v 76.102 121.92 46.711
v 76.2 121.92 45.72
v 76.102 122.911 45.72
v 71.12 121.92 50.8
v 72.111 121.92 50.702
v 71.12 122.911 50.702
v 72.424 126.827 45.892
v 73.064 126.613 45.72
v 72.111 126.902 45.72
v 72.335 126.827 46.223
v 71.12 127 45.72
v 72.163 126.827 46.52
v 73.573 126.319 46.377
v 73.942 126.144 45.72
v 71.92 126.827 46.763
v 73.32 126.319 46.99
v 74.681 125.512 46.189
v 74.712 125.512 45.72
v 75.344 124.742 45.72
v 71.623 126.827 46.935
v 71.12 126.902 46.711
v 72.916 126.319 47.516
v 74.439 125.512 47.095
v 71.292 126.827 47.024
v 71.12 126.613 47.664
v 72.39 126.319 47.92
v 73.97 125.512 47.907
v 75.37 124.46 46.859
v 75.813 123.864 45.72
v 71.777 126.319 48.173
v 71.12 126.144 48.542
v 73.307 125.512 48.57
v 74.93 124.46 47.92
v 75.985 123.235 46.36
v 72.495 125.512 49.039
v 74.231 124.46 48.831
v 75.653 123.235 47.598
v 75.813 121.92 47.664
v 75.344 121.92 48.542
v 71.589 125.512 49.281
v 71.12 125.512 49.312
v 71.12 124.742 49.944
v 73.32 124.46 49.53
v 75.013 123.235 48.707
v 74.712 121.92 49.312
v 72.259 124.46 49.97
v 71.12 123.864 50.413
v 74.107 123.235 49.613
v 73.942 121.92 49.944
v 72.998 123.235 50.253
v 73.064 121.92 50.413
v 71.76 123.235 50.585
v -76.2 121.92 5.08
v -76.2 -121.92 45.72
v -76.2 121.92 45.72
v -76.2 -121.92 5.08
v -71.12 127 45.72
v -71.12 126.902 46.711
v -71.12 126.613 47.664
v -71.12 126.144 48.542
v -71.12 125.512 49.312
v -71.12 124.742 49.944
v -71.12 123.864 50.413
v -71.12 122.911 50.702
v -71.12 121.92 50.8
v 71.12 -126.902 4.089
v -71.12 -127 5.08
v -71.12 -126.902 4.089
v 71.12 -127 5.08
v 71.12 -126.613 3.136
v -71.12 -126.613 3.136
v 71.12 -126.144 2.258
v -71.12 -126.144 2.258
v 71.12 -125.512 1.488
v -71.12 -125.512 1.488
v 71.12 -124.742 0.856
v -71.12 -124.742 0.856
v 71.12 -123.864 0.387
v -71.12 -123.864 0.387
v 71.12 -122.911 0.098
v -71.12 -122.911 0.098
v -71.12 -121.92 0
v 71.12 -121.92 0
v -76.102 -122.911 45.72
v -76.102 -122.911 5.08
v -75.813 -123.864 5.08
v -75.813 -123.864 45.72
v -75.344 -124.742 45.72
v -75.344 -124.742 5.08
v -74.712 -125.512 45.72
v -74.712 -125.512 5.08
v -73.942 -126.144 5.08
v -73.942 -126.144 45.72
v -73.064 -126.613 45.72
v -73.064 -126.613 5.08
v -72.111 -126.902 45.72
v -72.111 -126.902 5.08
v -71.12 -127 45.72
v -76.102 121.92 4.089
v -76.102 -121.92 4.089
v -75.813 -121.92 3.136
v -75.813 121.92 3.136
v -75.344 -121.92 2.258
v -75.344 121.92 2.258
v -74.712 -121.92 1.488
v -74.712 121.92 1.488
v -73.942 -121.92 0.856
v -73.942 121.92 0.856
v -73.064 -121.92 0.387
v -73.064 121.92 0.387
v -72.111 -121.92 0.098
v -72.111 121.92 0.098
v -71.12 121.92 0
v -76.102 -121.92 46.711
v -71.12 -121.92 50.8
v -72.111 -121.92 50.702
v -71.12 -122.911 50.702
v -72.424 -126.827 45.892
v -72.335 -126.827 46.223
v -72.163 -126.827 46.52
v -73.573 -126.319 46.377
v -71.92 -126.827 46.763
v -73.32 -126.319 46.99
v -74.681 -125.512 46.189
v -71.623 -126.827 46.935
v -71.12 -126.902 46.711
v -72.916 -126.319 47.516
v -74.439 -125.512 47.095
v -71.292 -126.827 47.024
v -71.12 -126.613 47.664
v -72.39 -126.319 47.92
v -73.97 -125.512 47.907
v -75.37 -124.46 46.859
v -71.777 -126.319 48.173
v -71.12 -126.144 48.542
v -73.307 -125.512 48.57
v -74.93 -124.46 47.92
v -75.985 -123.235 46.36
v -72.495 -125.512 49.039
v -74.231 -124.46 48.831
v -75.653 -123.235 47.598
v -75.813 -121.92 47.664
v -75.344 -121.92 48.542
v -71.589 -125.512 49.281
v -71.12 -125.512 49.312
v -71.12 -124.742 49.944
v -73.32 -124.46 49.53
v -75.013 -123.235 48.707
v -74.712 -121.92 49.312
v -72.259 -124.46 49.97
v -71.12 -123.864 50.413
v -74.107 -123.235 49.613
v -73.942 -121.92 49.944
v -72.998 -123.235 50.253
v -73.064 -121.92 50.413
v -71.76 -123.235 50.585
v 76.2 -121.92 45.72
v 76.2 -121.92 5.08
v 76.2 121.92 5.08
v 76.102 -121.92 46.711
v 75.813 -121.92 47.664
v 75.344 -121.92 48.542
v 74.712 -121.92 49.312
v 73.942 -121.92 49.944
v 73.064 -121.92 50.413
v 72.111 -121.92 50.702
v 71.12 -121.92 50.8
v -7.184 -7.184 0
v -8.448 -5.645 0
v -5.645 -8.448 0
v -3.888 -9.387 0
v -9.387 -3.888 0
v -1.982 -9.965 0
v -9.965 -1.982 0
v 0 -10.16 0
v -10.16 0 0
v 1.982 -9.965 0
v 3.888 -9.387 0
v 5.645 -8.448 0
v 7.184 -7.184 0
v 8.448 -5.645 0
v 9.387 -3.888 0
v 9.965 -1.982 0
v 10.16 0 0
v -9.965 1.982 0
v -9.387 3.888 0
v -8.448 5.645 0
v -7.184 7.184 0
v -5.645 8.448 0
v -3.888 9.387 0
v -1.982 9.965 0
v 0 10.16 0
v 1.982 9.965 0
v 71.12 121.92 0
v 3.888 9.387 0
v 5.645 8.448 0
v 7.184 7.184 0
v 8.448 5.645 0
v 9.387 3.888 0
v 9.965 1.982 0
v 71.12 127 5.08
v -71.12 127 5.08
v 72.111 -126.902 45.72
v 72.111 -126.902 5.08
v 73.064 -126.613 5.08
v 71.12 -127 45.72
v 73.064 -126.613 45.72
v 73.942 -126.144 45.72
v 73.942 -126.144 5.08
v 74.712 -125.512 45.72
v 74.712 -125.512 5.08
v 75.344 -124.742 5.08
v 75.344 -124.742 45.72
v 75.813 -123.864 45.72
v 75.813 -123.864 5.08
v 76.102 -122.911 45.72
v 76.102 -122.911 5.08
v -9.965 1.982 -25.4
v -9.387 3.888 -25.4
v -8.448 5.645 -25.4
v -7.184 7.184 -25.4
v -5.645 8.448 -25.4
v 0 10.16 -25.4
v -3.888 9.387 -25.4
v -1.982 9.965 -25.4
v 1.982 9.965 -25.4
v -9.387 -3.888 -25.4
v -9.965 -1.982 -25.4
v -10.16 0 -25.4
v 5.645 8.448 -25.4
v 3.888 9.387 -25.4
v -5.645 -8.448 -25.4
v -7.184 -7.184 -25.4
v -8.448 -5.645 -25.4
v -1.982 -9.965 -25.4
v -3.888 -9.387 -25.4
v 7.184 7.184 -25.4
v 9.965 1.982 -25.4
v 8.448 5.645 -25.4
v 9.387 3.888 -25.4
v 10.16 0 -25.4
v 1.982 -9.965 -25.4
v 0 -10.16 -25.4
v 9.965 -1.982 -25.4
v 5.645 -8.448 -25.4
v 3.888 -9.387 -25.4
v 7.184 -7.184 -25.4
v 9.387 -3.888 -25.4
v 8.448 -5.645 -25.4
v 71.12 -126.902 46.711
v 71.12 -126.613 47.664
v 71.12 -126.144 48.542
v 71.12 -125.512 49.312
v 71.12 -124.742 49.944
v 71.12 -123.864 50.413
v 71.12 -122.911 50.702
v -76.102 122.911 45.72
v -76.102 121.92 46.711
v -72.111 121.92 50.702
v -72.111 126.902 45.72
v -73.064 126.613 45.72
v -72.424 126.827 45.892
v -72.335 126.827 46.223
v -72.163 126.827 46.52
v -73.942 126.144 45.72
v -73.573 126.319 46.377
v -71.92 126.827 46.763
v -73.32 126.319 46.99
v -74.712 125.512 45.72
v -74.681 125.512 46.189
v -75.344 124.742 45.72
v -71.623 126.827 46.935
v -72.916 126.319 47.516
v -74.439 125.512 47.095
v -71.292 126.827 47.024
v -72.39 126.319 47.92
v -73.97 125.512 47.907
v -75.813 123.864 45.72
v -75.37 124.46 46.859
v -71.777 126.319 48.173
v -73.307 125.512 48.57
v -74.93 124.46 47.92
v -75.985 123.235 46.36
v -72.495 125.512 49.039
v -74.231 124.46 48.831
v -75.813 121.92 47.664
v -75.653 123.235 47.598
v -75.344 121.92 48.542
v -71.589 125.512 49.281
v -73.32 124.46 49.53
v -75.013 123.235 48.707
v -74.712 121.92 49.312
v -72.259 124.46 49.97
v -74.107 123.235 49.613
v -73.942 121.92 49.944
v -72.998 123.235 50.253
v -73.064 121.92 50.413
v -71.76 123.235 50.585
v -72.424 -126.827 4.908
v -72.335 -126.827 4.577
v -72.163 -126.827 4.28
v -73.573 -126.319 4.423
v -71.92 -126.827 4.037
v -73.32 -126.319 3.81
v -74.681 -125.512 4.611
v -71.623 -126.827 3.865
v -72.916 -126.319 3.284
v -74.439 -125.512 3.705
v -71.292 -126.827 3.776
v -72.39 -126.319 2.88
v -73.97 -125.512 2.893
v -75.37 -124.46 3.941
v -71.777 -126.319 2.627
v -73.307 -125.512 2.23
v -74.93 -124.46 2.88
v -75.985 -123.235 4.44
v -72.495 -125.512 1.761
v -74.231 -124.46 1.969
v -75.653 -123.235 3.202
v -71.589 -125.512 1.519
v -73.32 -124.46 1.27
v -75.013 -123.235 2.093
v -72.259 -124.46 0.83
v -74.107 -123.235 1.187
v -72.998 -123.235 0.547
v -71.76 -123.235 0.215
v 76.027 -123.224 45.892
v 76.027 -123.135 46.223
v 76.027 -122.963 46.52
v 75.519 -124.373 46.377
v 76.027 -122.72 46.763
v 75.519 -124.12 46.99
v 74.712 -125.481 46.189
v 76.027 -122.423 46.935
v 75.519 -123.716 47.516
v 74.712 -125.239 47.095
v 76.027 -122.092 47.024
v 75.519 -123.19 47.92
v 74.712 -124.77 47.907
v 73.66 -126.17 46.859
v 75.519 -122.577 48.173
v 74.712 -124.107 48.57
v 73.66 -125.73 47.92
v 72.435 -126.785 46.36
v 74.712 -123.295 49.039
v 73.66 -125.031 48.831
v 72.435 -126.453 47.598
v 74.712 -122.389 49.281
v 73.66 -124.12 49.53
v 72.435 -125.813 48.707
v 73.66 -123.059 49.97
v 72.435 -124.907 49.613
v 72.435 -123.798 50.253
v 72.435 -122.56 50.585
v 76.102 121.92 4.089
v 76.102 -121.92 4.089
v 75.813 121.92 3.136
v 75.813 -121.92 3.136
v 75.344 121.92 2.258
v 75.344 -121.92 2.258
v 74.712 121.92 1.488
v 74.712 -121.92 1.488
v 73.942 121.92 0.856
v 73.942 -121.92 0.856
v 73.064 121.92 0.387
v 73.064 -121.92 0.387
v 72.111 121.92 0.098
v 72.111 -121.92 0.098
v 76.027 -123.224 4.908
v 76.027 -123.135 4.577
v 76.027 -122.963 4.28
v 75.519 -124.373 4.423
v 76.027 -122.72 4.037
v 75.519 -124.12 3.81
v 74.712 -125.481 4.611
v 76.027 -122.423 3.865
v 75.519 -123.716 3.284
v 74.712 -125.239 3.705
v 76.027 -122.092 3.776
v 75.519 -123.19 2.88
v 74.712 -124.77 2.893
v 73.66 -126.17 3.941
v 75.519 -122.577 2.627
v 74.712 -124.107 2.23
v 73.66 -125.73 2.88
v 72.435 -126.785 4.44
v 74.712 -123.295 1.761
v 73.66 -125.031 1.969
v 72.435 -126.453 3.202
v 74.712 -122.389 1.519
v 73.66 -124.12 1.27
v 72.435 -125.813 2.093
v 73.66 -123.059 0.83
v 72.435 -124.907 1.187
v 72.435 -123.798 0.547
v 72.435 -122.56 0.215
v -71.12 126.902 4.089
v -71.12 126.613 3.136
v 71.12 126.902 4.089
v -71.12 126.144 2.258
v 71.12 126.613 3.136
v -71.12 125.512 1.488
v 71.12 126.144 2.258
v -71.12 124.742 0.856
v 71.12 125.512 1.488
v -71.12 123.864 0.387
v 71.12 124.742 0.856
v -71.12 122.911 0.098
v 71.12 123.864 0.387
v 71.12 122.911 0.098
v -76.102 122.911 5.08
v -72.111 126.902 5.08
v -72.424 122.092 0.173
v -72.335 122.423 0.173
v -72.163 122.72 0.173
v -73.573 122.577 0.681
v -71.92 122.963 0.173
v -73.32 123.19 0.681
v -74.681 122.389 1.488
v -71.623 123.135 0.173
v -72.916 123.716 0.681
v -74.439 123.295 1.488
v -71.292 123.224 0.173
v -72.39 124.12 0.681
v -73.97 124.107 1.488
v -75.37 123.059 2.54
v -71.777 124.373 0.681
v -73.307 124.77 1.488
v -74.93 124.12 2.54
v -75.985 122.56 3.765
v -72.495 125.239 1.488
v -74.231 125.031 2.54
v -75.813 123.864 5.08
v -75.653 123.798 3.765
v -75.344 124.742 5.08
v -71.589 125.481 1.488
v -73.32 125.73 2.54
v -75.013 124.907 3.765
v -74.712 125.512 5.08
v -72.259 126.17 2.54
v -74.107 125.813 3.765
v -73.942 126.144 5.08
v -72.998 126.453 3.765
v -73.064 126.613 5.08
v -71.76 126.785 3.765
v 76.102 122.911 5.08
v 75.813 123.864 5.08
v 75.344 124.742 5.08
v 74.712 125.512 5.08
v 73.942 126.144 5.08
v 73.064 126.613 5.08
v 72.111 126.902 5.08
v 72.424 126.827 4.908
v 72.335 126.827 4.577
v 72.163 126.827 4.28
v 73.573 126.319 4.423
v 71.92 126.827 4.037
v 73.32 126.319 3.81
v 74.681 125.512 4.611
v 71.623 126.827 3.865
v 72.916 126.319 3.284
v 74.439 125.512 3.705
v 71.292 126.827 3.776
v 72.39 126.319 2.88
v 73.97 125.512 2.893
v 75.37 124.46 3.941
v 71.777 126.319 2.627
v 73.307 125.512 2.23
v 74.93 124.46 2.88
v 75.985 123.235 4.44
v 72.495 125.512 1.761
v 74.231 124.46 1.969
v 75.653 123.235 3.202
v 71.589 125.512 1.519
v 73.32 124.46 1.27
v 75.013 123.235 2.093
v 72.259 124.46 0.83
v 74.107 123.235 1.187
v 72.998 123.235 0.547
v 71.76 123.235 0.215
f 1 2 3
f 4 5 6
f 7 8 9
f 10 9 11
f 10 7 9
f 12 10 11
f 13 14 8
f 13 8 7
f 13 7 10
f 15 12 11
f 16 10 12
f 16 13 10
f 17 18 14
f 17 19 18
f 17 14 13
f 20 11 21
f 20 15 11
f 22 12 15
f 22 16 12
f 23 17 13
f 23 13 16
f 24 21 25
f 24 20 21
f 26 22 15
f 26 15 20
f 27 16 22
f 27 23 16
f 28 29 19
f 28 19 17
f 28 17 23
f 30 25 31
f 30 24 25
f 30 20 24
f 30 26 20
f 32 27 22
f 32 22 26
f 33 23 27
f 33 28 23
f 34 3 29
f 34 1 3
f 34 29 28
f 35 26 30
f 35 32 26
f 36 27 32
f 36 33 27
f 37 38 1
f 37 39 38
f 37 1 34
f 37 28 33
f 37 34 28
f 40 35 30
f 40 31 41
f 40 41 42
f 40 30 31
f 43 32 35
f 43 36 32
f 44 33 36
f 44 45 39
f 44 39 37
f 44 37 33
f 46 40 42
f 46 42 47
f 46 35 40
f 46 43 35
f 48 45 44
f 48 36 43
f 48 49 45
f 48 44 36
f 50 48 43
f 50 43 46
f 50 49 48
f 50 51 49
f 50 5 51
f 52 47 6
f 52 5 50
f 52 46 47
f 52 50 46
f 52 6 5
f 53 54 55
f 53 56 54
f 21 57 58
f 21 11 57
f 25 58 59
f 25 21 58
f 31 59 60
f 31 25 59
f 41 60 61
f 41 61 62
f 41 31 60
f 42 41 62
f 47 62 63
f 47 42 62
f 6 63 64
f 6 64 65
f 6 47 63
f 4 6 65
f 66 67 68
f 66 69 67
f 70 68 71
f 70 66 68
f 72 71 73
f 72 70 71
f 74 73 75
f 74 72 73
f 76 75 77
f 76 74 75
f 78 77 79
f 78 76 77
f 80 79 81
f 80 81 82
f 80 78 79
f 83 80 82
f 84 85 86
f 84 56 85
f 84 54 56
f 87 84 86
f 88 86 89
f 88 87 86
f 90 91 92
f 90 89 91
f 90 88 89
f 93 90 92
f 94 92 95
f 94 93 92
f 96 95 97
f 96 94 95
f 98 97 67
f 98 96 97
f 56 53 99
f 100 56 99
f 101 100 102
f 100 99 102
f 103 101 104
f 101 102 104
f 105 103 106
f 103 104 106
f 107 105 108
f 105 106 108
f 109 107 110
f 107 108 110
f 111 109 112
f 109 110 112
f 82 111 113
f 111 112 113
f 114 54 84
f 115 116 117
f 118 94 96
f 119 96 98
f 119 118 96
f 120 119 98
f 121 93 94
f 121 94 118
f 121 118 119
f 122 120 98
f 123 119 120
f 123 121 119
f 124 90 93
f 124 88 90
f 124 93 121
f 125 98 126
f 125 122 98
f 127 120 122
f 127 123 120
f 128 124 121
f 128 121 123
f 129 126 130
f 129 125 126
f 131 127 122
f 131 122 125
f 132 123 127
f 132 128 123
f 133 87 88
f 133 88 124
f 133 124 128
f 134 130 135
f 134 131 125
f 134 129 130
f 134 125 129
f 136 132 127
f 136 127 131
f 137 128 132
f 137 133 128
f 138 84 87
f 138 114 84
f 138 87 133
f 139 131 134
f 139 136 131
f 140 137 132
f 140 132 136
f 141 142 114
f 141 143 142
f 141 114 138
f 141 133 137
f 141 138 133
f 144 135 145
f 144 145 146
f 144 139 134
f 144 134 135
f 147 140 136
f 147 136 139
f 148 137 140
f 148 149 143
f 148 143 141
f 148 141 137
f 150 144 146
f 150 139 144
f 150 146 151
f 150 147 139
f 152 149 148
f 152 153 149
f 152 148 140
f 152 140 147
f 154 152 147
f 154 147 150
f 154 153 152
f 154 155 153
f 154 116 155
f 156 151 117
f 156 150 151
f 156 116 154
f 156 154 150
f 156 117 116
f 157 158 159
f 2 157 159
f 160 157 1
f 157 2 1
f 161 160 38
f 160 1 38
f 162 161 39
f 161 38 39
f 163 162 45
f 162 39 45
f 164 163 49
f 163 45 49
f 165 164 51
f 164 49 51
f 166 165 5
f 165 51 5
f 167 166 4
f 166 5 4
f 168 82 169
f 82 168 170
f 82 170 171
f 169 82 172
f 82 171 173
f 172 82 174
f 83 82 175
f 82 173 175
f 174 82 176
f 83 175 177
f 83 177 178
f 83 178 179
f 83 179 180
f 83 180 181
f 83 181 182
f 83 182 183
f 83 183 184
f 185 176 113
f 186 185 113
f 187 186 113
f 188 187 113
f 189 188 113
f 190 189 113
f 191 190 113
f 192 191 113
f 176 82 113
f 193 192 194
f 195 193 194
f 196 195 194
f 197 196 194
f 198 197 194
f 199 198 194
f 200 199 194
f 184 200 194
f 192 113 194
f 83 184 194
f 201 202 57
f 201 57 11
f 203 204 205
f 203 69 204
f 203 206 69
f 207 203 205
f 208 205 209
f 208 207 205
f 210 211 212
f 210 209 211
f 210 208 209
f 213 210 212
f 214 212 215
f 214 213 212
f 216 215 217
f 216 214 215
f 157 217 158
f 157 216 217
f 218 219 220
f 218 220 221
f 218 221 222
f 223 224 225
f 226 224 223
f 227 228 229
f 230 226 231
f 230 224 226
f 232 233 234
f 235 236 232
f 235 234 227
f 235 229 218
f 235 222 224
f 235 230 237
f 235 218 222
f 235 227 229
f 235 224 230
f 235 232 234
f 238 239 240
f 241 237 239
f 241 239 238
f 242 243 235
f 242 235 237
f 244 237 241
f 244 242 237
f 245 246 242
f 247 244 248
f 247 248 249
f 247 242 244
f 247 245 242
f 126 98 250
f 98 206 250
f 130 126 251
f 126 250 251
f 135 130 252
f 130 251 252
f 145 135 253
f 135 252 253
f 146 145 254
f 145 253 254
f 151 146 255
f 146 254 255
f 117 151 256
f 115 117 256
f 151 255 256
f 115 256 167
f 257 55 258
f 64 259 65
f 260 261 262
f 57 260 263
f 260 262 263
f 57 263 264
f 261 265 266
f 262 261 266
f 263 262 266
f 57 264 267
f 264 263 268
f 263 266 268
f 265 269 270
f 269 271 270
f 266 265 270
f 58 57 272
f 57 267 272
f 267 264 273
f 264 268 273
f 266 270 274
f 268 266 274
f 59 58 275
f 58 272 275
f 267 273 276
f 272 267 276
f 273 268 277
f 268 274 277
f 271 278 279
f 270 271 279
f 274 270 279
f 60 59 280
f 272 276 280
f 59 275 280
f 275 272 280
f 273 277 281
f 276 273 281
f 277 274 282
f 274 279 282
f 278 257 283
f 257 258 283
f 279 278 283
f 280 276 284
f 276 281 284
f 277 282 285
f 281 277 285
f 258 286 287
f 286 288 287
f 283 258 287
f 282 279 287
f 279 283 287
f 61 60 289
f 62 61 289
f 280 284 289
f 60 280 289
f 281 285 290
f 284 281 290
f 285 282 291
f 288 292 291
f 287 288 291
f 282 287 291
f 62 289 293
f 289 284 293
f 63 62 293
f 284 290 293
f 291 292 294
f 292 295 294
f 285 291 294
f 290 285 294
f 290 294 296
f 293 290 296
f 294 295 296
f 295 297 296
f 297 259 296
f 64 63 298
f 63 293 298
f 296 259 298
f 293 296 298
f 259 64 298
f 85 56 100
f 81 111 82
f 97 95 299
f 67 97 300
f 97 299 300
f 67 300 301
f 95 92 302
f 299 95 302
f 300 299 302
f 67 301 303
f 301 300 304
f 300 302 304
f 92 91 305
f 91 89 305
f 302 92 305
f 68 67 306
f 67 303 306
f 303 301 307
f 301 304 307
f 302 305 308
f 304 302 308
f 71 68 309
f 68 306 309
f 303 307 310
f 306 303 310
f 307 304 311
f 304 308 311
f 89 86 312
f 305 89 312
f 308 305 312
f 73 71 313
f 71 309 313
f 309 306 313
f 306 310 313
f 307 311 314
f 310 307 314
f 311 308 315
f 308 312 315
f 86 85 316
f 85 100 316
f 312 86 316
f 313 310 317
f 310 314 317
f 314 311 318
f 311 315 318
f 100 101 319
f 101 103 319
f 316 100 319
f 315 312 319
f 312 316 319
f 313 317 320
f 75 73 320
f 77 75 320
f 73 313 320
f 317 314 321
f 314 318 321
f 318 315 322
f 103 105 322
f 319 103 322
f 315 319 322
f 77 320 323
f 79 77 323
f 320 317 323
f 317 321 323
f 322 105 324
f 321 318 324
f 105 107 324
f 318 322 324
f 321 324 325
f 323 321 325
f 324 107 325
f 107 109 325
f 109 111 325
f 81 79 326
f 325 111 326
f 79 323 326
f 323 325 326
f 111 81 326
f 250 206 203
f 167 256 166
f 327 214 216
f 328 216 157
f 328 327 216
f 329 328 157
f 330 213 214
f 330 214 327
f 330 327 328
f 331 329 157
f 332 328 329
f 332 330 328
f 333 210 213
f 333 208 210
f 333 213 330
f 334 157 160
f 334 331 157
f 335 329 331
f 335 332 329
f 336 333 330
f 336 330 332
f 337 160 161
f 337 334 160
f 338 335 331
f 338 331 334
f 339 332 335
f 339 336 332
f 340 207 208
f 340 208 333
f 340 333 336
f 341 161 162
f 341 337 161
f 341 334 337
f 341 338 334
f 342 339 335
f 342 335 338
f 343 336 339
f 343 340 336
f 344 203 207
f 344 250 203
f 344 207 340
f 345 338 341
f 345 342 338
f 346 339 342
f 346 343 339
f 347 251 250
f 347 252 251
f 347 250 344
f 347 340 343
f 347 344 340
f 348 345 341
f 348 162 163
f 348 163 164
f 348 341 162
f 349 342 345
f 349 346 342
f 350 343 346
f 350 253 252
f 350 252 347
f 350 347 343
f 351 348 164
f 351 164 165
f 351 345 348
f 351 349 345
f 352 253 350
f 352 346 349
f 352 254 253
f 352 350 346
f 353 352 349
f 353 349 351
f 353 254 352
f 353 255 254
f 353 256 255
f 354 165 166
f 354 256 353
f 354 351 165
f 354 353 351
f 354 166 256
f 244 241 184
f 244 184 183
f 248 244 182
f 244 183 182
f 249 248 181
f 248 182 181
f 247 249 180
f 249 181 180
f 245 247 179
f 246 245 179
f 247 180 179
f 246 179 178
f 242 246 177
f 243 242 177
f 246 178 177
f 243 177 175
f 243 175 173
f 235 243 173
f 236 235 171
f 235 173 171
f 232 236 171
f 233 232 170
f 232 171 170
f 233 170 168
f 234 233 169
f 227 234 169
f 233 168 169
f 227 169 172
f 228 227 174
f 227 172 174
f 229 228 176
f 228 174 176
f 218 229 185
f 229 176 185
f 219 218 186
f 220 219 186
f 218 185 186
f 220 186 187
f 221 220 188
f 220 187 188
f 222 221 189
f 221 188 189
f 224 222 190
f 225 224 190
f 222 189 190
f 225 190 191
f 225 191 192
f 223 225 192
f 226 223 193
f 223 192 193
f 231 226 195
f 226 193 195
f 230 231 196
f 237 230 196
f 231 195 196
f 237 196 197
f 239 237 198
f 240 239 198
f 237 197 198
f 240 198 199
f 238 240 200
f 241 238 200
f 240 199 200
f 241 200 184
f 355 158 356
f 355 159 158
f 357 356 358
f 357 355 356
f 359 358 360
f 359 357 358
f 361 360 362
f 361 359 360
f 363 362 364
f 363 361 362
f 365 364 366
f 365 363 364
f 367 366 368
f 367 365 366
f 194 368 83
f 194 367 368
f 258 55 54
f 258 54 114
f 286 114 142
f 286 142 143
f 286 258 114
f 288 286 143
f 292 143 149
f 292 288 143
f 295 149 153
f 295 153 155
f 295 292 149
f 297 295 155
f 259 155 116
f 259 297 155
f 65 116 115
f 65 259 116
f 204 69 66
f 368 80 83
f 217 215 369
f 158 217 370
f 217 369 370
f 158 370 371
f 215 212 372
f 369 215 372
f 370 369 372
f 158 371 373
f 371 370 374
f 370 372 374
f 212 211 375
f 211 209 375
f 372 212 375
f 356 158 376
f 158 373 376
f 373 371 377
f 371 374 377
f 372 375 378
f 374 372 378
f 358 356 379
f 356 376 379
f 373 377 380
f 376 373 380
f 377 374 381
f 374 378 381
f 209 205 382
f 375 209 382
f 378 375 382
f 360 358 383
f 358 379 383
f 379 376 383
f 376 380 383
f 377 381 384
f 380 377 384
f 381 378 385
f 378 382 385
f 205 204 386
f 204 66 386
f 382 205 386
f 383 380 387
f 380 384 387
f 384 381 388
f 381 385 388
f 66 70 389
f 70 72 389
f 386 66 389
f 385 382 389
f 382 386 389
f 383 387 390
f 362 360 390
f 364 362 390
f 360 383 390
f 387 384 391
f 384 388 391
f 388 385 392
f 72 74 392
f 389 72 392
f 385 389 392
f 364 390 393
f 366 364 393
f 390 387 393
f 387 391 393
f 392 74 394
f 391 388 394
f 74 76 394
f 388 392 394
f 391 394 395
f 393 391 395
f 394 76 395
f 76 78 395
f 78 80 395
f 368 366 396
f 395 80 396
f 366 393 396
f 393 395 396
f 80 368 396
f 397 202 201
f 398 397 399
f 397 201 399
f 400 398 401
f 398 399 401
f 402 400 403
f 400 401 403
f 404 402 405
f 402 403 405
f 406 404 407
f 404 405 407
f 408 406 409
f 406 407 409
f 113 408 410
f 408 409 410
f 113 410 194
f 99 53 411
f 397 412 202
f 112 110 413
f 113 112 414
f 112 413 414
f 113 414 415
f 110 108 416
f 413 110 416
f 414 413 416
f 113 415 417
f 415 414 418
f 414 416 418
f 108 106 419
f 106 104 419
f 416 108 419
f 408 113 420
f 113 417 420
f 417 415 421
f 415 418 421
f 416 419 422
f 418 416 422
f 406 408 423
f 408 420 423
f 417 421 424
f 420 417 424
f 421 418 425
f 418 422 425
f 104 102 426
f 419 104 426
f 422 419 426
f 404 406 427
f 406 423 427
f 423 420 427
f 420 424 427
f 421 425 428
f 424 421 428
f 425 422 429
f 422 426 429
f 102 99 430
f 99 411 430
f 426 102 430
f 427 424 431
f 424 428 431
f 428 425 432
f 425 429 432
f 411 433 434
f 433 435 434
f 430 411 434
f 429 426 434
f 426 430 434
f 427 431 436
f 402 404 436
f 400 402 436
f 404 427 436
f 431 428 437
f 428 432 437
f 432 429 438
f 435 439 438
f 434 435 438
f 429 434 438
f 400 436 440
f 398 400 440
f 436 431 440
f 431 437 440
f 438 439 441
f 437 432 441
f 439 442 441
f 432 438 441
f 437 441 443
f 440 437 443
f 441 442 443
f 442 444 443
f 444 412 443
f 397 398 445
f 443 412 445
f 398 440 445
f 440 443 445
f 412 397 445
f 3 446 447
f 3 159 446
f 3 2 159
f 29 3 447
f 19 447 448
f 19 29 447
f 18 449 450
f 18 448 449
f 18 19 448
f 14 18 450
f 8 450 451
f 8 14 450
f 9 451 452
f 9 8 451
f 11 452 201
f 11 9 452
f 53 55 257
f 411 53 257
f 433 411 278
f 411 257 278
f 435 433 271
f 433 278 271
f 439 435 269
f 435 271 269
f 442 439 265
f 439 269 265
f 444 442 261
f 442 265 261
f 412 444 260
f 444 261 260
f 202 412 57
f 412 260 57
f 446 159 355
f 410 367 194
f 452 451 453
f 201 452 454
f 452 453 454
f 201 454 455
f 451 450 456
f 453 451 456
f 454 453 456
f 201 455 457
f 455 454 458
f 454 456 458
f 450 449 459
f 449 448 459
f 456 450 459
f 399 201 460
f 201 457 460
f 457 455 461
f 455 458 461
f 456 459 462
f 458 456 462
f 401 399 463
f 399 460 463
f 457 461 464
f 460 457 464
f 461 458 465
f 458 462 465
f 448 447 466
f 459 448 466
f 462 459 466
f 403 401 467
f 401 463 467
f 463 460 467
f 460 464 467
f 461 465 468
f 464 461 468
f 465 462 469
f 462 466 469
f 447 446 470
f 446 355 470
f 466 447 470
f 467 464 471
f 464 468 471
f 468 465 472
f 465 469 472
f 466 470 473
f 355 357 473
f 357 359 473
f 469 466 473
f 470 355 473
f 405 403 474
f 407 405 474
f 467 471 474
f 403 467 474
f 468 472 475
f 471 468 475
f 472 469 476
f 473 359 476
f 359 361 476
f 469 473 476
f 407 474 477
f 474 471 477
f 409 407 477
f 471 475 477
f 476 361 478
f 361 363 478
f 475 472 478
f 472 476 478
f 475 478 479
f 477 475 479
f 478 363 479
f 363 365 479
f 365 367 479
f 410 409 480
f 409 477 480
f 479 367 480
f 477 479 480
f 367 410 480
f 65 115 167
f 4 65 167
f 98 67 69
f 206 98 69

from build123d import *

# Parameters (mm, degrees)
F0_W     = 152.4
F0_H     = 254
F1_DEPTH = 50.8
F2_R     = 5.08
F3_R     = 10.16
F4_DEPTH = 25.4


with BuildPart() as f1:
    # F0 (on Top) → F1 (new body)
    with BuildSketch(Plane.XY):
        Rectangle(F0_W, F0_H)
    extrude(amount=F1_DEPTH)

    # F2
    f2_edges = [f1.edges().sort_by_distance(p)[0] for p in [
        (-76.2, 0, 50.8),
        (-76.2, 127, 25.4),
        (-76.2, 0, 0),
        (-76.2, -127, 25.4),
        (0, -127, 50.8),
        (0, -127, 0),
        (76.2, -127, 25.4),
        (76.2, 0, 50.8),
        (76.2, 0, 0),
        (76.2, 127, 25.4),
        (0, 127, 0),
        (0, 127, 50.8),
    ]]
    fillet(f2_edges, radius=F2_R)

    # F3 (on face) → F4 (join)
    with BuildSketch(Plane(origin=(0, 0, 0), x_dir=(1, 0, 0), z_dir=(0, 0, -1))):
        Circle(F3_R)
    extrude(amount=F4_DEPTH)


solid = f1.part
